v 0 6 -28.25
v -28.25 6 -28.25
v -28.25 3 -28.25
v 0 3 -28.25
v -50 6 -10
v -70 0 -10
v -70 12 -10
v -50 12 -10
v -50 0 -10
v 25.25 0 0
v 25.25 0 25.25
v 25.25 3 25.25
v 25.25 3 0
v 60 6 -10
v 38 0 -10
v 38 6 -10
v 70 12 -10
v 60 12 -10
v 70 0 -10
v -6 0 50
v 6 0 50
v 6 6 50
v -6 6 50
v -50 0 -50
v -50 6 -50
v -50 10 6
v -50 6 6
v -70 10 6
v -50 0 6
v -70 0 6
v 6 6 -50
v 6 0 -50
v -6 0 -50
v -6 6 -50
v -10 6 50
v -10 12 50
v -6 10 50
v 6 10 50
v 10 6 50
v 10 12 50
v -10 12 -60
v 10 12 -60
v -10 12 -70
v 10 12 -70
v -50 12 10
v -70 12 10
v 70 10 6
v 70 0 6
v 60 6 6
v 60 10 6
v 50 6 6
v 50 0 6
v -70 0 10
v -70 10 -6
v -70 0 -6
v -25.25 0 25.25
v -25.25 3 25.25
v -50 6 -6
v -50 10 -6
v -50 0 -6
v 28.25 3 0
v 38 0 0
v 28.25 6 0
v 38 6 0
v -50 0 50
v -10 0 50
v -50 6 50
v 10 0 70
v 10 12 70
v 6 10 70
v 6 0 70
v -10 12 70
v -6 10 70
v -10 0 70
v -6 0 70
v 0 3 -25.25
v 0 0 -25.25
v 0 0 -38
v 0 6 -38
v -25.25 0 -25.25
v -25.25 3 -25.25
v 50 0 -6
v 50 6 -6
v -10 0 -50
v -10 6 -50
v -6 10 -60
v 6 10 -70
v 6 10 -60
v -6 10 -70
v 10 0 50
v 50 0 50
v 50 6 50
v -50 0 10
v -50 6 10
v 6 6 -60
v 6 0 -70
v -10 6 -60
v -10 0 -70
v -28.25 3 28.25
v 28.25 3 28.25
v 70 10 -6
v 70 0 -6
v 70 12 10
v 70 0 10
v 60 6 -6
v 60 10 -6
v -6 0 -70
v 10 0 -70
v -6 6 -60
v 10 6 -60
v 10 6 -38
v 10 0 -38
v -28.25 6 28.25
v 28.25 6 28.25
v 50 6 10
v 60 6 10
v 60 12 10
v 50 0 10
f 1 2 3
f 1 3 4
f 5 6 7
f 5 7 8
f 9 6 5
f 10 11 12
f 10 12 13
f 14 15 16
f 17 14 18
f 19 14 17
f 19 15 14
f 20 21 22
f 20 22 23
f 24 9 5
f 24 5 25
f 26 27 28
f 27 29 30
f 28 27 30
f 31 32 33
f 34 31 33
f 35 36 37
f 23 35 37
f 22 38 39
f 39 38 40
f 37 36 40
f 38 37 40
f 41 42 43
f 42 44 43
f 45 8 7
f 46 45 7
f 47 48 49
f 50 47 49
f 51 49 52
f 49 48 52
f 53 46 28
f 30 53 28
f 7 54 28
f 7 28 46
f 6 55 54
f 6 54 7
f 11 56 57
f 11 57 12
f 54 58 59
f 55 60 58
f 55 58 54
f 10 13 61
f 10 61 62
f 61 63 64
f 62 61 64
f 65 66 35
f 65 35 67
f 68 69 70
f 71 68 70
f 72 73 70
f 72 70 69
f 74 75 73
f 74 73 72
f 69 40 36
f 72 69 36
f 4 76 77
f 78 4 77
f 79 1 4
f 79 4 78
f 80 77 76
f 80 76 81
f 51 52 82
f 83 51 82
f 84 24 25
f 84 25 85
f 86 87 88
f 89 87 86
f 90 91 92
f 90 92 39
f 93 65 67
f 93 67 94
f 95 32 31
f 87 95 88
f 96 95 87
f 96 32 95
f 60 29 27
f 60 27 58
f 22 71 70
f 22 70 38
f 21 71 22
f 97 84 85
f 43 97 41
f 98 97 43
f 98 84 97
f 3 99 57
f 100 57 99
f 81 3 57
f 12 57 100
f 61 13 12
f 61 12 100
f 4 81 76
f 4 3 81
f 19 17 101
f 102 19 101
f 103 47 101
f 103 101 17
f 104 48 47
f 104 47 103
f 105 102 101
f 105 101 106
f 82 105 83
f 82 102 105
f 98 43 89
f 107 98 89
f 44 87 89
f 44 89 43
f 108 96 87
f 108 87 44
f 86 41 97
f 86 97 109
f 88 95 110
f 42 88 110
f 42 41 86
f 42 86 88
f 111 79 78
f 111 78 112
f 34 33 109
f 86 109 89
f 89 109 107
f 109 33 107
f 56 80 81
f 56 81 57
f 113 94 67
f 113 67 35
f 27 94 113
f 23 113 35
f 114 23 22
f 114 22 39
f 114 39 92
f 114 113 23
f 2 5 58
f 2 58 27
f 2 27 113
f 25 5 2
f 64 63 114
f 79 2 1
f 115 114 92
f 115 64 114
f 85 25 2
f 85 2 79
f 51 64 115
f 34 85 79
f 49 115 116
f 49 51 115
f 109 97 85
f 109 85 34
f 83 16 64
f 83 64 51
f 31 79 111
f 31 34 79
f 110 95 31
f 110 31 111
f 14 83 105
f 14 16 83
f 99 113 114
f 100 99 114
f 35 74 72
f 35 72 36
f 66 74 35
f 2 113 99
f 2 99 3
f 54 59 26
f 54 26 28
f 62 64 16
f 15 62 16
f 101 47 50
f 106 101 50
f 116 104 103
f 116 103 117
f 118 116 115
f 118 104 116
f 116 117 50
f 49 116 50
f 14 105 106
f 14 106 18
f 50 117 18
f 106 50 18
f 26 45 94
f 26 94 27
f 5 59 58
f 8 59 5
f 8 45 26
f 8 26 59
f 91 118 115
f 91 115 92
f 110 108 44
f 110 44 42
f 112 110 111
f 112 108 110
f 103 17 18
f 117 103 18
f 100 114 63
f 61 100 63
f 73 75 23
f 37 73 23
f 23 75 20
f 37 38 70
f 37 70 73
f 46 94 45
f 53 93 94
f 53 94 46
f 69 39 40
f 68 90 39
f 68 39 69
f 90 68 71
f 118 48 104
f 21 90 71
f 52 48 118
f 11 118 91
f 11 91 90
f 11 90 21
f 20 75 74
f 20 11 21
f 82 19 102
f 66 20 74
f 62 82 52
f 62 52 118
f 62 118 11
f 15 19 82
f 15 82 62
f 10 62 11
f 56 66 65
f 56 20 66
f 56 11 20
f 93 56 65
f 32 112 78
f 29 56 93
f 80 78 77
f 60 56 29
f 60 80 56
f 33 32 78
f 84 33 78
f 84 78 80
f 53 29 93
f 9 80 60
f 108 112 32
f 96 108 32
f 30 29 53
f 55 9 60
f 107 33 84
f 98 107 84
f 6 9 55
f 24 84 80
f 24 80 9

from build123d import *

# Parameters (mm, degrees)
BOSS_EXTRUDE10_DEPTH = 12
SKETCH6_W            = 100
SKETCH6_H            = 100
CUT_EXTRUDE1_DEPTH   = 6
SKETCH7_W            = 20
SKETCH7_H            = 12
SKETCH7_W_2          = 12
SKETCH7_H_2          = 20
CUT_EXTRUDE2_DEPTH   = 10
SKETCH8_W            = 56.5
SKETCH8_H            = 56.5
CUT_EXTRUDE3_DEPTH   = 3
SKETCH10_W           = 20
SKETCH10_H           = 10
SKETCH10_W_2         = 10
SKETCH10_H_2         = 20
CUT_EXTRUDE6_DEPTH   = 6
SKETCH11_W           = 10
SKETCH11_H           = 12.75
SKETCH11_W_2         = 12.75
SKETCH11_H_2         = 10
CUT_EXTRUDE7_DEPTH   = 100.176610146


with BuildPart() as part:
    # Sketch1 → Boss-Extrude10 (new body)
    with BuildSketch(Plane(origin=(0, 0, 0), x_dir=(1, 0, 0), z_dir=(0, 1, 0))):
        Polygon((-50, 50), (-10, 50), (-10, 70), (10, 70), (10, 25.25), (-25.25, 25.25), (-25.25, -25.25), (25.25, -25.25), (25.25, 10), (70, 10), (70, -10), (50, -10), (50, -50), (10, -50), (10, -70), (-10, -70), (-10, -50), (-50, -50), (-50, -10), (-70, -10), (-70, 10), (-50, 10), align=None)
    extrude(amount=BOSS_EXTRUDE10_DEPTH)

    # Sketch6 → Cut-Extrude1 (cut)
    with BuildSketch(Plane(origin=(0, 12, 0), x_dir=(1, 0, 0), z_dir=(0, 1, 0))):
        Rectangle(SKETCH6_W, SKETCH6_H)
    extrude(amount=-CUT_EXTRUDE1_DEPTH, mode=Mode.SUBTRACT)

    # Sketch7 → Cut-Extrude2 (cut)
    with BuildSketch(Plane(origin=(0, 0, 0), x_dir=(-1, 0, 0), z_dir=(0, -1, 0))):
        with Locations((60, 0)):
            Rectangle(SKETCH7_W, SKETCH7_H)
        with Locations((0, -60)):
            Rectangle(SKETCH7_W_2, SKETCH7_H_2)
        with Locations((-60, 0)):
            Rectangle(SKETCH7_W, SKETCH7_H)
        with Locations((0, 60)):
            Rectangle(SKETCH7_W_2, SKETCH7_H_2)
    extrude(amount=-CUT_EXTRUDE2_DEPTH, mode=Mode.SUBTRACT)

    # Sketch8 → Cut-Extrude3 (cut)
    with BuildSketch(Plane(origin=(0, 6, 0), x_dir=(1, 0, 0), z_dir=(0, 1, 0))):
        Rectangle(SKETCH8_W, SKETCH8_H)
    extrude(amount=-CUT_EXTRUDE3_DEPTH, mode=Mode.SUBTRACT)

    # Sketch10 → Cut-Extrude6 (cut)
    with BuildSketch(Plane(origin=(0, 12, 0), x_dir=(1, 0, 0), z_dir=(0, 1, 0))):
        with Locations((0, 55)):
            Rectangle(SKETCH10_W, SKETCH10_H)
        with Locations((55, 0)):
            Rectangle(SKETCH10_W_2, SKETCH10_H_2)
    extrude(amount=-CUT_EXTRUDE6_DEPTH, mode=Mode.SUBTRACT)

    # Sketch11 → Cut-Extrude7 (cut, through all)
    with BuildSketch(Plane(origin=(0, 6, 0), x_dir=(1, 0, 0), z_dir=(0, 1, 0))):
        with Locations((5, 31.625)):
            Rectangle(SKETCH11_W, SKETCH11_H)
        with Locations((31.625, 5)):
            Rectangle(SKETCH11_W_2, SKETCH11_H_2)
    extrude(amount=-CUT_EXTRUDE7_DEPTH, mode=Mode.SUBTRACT)


solid = part.part
